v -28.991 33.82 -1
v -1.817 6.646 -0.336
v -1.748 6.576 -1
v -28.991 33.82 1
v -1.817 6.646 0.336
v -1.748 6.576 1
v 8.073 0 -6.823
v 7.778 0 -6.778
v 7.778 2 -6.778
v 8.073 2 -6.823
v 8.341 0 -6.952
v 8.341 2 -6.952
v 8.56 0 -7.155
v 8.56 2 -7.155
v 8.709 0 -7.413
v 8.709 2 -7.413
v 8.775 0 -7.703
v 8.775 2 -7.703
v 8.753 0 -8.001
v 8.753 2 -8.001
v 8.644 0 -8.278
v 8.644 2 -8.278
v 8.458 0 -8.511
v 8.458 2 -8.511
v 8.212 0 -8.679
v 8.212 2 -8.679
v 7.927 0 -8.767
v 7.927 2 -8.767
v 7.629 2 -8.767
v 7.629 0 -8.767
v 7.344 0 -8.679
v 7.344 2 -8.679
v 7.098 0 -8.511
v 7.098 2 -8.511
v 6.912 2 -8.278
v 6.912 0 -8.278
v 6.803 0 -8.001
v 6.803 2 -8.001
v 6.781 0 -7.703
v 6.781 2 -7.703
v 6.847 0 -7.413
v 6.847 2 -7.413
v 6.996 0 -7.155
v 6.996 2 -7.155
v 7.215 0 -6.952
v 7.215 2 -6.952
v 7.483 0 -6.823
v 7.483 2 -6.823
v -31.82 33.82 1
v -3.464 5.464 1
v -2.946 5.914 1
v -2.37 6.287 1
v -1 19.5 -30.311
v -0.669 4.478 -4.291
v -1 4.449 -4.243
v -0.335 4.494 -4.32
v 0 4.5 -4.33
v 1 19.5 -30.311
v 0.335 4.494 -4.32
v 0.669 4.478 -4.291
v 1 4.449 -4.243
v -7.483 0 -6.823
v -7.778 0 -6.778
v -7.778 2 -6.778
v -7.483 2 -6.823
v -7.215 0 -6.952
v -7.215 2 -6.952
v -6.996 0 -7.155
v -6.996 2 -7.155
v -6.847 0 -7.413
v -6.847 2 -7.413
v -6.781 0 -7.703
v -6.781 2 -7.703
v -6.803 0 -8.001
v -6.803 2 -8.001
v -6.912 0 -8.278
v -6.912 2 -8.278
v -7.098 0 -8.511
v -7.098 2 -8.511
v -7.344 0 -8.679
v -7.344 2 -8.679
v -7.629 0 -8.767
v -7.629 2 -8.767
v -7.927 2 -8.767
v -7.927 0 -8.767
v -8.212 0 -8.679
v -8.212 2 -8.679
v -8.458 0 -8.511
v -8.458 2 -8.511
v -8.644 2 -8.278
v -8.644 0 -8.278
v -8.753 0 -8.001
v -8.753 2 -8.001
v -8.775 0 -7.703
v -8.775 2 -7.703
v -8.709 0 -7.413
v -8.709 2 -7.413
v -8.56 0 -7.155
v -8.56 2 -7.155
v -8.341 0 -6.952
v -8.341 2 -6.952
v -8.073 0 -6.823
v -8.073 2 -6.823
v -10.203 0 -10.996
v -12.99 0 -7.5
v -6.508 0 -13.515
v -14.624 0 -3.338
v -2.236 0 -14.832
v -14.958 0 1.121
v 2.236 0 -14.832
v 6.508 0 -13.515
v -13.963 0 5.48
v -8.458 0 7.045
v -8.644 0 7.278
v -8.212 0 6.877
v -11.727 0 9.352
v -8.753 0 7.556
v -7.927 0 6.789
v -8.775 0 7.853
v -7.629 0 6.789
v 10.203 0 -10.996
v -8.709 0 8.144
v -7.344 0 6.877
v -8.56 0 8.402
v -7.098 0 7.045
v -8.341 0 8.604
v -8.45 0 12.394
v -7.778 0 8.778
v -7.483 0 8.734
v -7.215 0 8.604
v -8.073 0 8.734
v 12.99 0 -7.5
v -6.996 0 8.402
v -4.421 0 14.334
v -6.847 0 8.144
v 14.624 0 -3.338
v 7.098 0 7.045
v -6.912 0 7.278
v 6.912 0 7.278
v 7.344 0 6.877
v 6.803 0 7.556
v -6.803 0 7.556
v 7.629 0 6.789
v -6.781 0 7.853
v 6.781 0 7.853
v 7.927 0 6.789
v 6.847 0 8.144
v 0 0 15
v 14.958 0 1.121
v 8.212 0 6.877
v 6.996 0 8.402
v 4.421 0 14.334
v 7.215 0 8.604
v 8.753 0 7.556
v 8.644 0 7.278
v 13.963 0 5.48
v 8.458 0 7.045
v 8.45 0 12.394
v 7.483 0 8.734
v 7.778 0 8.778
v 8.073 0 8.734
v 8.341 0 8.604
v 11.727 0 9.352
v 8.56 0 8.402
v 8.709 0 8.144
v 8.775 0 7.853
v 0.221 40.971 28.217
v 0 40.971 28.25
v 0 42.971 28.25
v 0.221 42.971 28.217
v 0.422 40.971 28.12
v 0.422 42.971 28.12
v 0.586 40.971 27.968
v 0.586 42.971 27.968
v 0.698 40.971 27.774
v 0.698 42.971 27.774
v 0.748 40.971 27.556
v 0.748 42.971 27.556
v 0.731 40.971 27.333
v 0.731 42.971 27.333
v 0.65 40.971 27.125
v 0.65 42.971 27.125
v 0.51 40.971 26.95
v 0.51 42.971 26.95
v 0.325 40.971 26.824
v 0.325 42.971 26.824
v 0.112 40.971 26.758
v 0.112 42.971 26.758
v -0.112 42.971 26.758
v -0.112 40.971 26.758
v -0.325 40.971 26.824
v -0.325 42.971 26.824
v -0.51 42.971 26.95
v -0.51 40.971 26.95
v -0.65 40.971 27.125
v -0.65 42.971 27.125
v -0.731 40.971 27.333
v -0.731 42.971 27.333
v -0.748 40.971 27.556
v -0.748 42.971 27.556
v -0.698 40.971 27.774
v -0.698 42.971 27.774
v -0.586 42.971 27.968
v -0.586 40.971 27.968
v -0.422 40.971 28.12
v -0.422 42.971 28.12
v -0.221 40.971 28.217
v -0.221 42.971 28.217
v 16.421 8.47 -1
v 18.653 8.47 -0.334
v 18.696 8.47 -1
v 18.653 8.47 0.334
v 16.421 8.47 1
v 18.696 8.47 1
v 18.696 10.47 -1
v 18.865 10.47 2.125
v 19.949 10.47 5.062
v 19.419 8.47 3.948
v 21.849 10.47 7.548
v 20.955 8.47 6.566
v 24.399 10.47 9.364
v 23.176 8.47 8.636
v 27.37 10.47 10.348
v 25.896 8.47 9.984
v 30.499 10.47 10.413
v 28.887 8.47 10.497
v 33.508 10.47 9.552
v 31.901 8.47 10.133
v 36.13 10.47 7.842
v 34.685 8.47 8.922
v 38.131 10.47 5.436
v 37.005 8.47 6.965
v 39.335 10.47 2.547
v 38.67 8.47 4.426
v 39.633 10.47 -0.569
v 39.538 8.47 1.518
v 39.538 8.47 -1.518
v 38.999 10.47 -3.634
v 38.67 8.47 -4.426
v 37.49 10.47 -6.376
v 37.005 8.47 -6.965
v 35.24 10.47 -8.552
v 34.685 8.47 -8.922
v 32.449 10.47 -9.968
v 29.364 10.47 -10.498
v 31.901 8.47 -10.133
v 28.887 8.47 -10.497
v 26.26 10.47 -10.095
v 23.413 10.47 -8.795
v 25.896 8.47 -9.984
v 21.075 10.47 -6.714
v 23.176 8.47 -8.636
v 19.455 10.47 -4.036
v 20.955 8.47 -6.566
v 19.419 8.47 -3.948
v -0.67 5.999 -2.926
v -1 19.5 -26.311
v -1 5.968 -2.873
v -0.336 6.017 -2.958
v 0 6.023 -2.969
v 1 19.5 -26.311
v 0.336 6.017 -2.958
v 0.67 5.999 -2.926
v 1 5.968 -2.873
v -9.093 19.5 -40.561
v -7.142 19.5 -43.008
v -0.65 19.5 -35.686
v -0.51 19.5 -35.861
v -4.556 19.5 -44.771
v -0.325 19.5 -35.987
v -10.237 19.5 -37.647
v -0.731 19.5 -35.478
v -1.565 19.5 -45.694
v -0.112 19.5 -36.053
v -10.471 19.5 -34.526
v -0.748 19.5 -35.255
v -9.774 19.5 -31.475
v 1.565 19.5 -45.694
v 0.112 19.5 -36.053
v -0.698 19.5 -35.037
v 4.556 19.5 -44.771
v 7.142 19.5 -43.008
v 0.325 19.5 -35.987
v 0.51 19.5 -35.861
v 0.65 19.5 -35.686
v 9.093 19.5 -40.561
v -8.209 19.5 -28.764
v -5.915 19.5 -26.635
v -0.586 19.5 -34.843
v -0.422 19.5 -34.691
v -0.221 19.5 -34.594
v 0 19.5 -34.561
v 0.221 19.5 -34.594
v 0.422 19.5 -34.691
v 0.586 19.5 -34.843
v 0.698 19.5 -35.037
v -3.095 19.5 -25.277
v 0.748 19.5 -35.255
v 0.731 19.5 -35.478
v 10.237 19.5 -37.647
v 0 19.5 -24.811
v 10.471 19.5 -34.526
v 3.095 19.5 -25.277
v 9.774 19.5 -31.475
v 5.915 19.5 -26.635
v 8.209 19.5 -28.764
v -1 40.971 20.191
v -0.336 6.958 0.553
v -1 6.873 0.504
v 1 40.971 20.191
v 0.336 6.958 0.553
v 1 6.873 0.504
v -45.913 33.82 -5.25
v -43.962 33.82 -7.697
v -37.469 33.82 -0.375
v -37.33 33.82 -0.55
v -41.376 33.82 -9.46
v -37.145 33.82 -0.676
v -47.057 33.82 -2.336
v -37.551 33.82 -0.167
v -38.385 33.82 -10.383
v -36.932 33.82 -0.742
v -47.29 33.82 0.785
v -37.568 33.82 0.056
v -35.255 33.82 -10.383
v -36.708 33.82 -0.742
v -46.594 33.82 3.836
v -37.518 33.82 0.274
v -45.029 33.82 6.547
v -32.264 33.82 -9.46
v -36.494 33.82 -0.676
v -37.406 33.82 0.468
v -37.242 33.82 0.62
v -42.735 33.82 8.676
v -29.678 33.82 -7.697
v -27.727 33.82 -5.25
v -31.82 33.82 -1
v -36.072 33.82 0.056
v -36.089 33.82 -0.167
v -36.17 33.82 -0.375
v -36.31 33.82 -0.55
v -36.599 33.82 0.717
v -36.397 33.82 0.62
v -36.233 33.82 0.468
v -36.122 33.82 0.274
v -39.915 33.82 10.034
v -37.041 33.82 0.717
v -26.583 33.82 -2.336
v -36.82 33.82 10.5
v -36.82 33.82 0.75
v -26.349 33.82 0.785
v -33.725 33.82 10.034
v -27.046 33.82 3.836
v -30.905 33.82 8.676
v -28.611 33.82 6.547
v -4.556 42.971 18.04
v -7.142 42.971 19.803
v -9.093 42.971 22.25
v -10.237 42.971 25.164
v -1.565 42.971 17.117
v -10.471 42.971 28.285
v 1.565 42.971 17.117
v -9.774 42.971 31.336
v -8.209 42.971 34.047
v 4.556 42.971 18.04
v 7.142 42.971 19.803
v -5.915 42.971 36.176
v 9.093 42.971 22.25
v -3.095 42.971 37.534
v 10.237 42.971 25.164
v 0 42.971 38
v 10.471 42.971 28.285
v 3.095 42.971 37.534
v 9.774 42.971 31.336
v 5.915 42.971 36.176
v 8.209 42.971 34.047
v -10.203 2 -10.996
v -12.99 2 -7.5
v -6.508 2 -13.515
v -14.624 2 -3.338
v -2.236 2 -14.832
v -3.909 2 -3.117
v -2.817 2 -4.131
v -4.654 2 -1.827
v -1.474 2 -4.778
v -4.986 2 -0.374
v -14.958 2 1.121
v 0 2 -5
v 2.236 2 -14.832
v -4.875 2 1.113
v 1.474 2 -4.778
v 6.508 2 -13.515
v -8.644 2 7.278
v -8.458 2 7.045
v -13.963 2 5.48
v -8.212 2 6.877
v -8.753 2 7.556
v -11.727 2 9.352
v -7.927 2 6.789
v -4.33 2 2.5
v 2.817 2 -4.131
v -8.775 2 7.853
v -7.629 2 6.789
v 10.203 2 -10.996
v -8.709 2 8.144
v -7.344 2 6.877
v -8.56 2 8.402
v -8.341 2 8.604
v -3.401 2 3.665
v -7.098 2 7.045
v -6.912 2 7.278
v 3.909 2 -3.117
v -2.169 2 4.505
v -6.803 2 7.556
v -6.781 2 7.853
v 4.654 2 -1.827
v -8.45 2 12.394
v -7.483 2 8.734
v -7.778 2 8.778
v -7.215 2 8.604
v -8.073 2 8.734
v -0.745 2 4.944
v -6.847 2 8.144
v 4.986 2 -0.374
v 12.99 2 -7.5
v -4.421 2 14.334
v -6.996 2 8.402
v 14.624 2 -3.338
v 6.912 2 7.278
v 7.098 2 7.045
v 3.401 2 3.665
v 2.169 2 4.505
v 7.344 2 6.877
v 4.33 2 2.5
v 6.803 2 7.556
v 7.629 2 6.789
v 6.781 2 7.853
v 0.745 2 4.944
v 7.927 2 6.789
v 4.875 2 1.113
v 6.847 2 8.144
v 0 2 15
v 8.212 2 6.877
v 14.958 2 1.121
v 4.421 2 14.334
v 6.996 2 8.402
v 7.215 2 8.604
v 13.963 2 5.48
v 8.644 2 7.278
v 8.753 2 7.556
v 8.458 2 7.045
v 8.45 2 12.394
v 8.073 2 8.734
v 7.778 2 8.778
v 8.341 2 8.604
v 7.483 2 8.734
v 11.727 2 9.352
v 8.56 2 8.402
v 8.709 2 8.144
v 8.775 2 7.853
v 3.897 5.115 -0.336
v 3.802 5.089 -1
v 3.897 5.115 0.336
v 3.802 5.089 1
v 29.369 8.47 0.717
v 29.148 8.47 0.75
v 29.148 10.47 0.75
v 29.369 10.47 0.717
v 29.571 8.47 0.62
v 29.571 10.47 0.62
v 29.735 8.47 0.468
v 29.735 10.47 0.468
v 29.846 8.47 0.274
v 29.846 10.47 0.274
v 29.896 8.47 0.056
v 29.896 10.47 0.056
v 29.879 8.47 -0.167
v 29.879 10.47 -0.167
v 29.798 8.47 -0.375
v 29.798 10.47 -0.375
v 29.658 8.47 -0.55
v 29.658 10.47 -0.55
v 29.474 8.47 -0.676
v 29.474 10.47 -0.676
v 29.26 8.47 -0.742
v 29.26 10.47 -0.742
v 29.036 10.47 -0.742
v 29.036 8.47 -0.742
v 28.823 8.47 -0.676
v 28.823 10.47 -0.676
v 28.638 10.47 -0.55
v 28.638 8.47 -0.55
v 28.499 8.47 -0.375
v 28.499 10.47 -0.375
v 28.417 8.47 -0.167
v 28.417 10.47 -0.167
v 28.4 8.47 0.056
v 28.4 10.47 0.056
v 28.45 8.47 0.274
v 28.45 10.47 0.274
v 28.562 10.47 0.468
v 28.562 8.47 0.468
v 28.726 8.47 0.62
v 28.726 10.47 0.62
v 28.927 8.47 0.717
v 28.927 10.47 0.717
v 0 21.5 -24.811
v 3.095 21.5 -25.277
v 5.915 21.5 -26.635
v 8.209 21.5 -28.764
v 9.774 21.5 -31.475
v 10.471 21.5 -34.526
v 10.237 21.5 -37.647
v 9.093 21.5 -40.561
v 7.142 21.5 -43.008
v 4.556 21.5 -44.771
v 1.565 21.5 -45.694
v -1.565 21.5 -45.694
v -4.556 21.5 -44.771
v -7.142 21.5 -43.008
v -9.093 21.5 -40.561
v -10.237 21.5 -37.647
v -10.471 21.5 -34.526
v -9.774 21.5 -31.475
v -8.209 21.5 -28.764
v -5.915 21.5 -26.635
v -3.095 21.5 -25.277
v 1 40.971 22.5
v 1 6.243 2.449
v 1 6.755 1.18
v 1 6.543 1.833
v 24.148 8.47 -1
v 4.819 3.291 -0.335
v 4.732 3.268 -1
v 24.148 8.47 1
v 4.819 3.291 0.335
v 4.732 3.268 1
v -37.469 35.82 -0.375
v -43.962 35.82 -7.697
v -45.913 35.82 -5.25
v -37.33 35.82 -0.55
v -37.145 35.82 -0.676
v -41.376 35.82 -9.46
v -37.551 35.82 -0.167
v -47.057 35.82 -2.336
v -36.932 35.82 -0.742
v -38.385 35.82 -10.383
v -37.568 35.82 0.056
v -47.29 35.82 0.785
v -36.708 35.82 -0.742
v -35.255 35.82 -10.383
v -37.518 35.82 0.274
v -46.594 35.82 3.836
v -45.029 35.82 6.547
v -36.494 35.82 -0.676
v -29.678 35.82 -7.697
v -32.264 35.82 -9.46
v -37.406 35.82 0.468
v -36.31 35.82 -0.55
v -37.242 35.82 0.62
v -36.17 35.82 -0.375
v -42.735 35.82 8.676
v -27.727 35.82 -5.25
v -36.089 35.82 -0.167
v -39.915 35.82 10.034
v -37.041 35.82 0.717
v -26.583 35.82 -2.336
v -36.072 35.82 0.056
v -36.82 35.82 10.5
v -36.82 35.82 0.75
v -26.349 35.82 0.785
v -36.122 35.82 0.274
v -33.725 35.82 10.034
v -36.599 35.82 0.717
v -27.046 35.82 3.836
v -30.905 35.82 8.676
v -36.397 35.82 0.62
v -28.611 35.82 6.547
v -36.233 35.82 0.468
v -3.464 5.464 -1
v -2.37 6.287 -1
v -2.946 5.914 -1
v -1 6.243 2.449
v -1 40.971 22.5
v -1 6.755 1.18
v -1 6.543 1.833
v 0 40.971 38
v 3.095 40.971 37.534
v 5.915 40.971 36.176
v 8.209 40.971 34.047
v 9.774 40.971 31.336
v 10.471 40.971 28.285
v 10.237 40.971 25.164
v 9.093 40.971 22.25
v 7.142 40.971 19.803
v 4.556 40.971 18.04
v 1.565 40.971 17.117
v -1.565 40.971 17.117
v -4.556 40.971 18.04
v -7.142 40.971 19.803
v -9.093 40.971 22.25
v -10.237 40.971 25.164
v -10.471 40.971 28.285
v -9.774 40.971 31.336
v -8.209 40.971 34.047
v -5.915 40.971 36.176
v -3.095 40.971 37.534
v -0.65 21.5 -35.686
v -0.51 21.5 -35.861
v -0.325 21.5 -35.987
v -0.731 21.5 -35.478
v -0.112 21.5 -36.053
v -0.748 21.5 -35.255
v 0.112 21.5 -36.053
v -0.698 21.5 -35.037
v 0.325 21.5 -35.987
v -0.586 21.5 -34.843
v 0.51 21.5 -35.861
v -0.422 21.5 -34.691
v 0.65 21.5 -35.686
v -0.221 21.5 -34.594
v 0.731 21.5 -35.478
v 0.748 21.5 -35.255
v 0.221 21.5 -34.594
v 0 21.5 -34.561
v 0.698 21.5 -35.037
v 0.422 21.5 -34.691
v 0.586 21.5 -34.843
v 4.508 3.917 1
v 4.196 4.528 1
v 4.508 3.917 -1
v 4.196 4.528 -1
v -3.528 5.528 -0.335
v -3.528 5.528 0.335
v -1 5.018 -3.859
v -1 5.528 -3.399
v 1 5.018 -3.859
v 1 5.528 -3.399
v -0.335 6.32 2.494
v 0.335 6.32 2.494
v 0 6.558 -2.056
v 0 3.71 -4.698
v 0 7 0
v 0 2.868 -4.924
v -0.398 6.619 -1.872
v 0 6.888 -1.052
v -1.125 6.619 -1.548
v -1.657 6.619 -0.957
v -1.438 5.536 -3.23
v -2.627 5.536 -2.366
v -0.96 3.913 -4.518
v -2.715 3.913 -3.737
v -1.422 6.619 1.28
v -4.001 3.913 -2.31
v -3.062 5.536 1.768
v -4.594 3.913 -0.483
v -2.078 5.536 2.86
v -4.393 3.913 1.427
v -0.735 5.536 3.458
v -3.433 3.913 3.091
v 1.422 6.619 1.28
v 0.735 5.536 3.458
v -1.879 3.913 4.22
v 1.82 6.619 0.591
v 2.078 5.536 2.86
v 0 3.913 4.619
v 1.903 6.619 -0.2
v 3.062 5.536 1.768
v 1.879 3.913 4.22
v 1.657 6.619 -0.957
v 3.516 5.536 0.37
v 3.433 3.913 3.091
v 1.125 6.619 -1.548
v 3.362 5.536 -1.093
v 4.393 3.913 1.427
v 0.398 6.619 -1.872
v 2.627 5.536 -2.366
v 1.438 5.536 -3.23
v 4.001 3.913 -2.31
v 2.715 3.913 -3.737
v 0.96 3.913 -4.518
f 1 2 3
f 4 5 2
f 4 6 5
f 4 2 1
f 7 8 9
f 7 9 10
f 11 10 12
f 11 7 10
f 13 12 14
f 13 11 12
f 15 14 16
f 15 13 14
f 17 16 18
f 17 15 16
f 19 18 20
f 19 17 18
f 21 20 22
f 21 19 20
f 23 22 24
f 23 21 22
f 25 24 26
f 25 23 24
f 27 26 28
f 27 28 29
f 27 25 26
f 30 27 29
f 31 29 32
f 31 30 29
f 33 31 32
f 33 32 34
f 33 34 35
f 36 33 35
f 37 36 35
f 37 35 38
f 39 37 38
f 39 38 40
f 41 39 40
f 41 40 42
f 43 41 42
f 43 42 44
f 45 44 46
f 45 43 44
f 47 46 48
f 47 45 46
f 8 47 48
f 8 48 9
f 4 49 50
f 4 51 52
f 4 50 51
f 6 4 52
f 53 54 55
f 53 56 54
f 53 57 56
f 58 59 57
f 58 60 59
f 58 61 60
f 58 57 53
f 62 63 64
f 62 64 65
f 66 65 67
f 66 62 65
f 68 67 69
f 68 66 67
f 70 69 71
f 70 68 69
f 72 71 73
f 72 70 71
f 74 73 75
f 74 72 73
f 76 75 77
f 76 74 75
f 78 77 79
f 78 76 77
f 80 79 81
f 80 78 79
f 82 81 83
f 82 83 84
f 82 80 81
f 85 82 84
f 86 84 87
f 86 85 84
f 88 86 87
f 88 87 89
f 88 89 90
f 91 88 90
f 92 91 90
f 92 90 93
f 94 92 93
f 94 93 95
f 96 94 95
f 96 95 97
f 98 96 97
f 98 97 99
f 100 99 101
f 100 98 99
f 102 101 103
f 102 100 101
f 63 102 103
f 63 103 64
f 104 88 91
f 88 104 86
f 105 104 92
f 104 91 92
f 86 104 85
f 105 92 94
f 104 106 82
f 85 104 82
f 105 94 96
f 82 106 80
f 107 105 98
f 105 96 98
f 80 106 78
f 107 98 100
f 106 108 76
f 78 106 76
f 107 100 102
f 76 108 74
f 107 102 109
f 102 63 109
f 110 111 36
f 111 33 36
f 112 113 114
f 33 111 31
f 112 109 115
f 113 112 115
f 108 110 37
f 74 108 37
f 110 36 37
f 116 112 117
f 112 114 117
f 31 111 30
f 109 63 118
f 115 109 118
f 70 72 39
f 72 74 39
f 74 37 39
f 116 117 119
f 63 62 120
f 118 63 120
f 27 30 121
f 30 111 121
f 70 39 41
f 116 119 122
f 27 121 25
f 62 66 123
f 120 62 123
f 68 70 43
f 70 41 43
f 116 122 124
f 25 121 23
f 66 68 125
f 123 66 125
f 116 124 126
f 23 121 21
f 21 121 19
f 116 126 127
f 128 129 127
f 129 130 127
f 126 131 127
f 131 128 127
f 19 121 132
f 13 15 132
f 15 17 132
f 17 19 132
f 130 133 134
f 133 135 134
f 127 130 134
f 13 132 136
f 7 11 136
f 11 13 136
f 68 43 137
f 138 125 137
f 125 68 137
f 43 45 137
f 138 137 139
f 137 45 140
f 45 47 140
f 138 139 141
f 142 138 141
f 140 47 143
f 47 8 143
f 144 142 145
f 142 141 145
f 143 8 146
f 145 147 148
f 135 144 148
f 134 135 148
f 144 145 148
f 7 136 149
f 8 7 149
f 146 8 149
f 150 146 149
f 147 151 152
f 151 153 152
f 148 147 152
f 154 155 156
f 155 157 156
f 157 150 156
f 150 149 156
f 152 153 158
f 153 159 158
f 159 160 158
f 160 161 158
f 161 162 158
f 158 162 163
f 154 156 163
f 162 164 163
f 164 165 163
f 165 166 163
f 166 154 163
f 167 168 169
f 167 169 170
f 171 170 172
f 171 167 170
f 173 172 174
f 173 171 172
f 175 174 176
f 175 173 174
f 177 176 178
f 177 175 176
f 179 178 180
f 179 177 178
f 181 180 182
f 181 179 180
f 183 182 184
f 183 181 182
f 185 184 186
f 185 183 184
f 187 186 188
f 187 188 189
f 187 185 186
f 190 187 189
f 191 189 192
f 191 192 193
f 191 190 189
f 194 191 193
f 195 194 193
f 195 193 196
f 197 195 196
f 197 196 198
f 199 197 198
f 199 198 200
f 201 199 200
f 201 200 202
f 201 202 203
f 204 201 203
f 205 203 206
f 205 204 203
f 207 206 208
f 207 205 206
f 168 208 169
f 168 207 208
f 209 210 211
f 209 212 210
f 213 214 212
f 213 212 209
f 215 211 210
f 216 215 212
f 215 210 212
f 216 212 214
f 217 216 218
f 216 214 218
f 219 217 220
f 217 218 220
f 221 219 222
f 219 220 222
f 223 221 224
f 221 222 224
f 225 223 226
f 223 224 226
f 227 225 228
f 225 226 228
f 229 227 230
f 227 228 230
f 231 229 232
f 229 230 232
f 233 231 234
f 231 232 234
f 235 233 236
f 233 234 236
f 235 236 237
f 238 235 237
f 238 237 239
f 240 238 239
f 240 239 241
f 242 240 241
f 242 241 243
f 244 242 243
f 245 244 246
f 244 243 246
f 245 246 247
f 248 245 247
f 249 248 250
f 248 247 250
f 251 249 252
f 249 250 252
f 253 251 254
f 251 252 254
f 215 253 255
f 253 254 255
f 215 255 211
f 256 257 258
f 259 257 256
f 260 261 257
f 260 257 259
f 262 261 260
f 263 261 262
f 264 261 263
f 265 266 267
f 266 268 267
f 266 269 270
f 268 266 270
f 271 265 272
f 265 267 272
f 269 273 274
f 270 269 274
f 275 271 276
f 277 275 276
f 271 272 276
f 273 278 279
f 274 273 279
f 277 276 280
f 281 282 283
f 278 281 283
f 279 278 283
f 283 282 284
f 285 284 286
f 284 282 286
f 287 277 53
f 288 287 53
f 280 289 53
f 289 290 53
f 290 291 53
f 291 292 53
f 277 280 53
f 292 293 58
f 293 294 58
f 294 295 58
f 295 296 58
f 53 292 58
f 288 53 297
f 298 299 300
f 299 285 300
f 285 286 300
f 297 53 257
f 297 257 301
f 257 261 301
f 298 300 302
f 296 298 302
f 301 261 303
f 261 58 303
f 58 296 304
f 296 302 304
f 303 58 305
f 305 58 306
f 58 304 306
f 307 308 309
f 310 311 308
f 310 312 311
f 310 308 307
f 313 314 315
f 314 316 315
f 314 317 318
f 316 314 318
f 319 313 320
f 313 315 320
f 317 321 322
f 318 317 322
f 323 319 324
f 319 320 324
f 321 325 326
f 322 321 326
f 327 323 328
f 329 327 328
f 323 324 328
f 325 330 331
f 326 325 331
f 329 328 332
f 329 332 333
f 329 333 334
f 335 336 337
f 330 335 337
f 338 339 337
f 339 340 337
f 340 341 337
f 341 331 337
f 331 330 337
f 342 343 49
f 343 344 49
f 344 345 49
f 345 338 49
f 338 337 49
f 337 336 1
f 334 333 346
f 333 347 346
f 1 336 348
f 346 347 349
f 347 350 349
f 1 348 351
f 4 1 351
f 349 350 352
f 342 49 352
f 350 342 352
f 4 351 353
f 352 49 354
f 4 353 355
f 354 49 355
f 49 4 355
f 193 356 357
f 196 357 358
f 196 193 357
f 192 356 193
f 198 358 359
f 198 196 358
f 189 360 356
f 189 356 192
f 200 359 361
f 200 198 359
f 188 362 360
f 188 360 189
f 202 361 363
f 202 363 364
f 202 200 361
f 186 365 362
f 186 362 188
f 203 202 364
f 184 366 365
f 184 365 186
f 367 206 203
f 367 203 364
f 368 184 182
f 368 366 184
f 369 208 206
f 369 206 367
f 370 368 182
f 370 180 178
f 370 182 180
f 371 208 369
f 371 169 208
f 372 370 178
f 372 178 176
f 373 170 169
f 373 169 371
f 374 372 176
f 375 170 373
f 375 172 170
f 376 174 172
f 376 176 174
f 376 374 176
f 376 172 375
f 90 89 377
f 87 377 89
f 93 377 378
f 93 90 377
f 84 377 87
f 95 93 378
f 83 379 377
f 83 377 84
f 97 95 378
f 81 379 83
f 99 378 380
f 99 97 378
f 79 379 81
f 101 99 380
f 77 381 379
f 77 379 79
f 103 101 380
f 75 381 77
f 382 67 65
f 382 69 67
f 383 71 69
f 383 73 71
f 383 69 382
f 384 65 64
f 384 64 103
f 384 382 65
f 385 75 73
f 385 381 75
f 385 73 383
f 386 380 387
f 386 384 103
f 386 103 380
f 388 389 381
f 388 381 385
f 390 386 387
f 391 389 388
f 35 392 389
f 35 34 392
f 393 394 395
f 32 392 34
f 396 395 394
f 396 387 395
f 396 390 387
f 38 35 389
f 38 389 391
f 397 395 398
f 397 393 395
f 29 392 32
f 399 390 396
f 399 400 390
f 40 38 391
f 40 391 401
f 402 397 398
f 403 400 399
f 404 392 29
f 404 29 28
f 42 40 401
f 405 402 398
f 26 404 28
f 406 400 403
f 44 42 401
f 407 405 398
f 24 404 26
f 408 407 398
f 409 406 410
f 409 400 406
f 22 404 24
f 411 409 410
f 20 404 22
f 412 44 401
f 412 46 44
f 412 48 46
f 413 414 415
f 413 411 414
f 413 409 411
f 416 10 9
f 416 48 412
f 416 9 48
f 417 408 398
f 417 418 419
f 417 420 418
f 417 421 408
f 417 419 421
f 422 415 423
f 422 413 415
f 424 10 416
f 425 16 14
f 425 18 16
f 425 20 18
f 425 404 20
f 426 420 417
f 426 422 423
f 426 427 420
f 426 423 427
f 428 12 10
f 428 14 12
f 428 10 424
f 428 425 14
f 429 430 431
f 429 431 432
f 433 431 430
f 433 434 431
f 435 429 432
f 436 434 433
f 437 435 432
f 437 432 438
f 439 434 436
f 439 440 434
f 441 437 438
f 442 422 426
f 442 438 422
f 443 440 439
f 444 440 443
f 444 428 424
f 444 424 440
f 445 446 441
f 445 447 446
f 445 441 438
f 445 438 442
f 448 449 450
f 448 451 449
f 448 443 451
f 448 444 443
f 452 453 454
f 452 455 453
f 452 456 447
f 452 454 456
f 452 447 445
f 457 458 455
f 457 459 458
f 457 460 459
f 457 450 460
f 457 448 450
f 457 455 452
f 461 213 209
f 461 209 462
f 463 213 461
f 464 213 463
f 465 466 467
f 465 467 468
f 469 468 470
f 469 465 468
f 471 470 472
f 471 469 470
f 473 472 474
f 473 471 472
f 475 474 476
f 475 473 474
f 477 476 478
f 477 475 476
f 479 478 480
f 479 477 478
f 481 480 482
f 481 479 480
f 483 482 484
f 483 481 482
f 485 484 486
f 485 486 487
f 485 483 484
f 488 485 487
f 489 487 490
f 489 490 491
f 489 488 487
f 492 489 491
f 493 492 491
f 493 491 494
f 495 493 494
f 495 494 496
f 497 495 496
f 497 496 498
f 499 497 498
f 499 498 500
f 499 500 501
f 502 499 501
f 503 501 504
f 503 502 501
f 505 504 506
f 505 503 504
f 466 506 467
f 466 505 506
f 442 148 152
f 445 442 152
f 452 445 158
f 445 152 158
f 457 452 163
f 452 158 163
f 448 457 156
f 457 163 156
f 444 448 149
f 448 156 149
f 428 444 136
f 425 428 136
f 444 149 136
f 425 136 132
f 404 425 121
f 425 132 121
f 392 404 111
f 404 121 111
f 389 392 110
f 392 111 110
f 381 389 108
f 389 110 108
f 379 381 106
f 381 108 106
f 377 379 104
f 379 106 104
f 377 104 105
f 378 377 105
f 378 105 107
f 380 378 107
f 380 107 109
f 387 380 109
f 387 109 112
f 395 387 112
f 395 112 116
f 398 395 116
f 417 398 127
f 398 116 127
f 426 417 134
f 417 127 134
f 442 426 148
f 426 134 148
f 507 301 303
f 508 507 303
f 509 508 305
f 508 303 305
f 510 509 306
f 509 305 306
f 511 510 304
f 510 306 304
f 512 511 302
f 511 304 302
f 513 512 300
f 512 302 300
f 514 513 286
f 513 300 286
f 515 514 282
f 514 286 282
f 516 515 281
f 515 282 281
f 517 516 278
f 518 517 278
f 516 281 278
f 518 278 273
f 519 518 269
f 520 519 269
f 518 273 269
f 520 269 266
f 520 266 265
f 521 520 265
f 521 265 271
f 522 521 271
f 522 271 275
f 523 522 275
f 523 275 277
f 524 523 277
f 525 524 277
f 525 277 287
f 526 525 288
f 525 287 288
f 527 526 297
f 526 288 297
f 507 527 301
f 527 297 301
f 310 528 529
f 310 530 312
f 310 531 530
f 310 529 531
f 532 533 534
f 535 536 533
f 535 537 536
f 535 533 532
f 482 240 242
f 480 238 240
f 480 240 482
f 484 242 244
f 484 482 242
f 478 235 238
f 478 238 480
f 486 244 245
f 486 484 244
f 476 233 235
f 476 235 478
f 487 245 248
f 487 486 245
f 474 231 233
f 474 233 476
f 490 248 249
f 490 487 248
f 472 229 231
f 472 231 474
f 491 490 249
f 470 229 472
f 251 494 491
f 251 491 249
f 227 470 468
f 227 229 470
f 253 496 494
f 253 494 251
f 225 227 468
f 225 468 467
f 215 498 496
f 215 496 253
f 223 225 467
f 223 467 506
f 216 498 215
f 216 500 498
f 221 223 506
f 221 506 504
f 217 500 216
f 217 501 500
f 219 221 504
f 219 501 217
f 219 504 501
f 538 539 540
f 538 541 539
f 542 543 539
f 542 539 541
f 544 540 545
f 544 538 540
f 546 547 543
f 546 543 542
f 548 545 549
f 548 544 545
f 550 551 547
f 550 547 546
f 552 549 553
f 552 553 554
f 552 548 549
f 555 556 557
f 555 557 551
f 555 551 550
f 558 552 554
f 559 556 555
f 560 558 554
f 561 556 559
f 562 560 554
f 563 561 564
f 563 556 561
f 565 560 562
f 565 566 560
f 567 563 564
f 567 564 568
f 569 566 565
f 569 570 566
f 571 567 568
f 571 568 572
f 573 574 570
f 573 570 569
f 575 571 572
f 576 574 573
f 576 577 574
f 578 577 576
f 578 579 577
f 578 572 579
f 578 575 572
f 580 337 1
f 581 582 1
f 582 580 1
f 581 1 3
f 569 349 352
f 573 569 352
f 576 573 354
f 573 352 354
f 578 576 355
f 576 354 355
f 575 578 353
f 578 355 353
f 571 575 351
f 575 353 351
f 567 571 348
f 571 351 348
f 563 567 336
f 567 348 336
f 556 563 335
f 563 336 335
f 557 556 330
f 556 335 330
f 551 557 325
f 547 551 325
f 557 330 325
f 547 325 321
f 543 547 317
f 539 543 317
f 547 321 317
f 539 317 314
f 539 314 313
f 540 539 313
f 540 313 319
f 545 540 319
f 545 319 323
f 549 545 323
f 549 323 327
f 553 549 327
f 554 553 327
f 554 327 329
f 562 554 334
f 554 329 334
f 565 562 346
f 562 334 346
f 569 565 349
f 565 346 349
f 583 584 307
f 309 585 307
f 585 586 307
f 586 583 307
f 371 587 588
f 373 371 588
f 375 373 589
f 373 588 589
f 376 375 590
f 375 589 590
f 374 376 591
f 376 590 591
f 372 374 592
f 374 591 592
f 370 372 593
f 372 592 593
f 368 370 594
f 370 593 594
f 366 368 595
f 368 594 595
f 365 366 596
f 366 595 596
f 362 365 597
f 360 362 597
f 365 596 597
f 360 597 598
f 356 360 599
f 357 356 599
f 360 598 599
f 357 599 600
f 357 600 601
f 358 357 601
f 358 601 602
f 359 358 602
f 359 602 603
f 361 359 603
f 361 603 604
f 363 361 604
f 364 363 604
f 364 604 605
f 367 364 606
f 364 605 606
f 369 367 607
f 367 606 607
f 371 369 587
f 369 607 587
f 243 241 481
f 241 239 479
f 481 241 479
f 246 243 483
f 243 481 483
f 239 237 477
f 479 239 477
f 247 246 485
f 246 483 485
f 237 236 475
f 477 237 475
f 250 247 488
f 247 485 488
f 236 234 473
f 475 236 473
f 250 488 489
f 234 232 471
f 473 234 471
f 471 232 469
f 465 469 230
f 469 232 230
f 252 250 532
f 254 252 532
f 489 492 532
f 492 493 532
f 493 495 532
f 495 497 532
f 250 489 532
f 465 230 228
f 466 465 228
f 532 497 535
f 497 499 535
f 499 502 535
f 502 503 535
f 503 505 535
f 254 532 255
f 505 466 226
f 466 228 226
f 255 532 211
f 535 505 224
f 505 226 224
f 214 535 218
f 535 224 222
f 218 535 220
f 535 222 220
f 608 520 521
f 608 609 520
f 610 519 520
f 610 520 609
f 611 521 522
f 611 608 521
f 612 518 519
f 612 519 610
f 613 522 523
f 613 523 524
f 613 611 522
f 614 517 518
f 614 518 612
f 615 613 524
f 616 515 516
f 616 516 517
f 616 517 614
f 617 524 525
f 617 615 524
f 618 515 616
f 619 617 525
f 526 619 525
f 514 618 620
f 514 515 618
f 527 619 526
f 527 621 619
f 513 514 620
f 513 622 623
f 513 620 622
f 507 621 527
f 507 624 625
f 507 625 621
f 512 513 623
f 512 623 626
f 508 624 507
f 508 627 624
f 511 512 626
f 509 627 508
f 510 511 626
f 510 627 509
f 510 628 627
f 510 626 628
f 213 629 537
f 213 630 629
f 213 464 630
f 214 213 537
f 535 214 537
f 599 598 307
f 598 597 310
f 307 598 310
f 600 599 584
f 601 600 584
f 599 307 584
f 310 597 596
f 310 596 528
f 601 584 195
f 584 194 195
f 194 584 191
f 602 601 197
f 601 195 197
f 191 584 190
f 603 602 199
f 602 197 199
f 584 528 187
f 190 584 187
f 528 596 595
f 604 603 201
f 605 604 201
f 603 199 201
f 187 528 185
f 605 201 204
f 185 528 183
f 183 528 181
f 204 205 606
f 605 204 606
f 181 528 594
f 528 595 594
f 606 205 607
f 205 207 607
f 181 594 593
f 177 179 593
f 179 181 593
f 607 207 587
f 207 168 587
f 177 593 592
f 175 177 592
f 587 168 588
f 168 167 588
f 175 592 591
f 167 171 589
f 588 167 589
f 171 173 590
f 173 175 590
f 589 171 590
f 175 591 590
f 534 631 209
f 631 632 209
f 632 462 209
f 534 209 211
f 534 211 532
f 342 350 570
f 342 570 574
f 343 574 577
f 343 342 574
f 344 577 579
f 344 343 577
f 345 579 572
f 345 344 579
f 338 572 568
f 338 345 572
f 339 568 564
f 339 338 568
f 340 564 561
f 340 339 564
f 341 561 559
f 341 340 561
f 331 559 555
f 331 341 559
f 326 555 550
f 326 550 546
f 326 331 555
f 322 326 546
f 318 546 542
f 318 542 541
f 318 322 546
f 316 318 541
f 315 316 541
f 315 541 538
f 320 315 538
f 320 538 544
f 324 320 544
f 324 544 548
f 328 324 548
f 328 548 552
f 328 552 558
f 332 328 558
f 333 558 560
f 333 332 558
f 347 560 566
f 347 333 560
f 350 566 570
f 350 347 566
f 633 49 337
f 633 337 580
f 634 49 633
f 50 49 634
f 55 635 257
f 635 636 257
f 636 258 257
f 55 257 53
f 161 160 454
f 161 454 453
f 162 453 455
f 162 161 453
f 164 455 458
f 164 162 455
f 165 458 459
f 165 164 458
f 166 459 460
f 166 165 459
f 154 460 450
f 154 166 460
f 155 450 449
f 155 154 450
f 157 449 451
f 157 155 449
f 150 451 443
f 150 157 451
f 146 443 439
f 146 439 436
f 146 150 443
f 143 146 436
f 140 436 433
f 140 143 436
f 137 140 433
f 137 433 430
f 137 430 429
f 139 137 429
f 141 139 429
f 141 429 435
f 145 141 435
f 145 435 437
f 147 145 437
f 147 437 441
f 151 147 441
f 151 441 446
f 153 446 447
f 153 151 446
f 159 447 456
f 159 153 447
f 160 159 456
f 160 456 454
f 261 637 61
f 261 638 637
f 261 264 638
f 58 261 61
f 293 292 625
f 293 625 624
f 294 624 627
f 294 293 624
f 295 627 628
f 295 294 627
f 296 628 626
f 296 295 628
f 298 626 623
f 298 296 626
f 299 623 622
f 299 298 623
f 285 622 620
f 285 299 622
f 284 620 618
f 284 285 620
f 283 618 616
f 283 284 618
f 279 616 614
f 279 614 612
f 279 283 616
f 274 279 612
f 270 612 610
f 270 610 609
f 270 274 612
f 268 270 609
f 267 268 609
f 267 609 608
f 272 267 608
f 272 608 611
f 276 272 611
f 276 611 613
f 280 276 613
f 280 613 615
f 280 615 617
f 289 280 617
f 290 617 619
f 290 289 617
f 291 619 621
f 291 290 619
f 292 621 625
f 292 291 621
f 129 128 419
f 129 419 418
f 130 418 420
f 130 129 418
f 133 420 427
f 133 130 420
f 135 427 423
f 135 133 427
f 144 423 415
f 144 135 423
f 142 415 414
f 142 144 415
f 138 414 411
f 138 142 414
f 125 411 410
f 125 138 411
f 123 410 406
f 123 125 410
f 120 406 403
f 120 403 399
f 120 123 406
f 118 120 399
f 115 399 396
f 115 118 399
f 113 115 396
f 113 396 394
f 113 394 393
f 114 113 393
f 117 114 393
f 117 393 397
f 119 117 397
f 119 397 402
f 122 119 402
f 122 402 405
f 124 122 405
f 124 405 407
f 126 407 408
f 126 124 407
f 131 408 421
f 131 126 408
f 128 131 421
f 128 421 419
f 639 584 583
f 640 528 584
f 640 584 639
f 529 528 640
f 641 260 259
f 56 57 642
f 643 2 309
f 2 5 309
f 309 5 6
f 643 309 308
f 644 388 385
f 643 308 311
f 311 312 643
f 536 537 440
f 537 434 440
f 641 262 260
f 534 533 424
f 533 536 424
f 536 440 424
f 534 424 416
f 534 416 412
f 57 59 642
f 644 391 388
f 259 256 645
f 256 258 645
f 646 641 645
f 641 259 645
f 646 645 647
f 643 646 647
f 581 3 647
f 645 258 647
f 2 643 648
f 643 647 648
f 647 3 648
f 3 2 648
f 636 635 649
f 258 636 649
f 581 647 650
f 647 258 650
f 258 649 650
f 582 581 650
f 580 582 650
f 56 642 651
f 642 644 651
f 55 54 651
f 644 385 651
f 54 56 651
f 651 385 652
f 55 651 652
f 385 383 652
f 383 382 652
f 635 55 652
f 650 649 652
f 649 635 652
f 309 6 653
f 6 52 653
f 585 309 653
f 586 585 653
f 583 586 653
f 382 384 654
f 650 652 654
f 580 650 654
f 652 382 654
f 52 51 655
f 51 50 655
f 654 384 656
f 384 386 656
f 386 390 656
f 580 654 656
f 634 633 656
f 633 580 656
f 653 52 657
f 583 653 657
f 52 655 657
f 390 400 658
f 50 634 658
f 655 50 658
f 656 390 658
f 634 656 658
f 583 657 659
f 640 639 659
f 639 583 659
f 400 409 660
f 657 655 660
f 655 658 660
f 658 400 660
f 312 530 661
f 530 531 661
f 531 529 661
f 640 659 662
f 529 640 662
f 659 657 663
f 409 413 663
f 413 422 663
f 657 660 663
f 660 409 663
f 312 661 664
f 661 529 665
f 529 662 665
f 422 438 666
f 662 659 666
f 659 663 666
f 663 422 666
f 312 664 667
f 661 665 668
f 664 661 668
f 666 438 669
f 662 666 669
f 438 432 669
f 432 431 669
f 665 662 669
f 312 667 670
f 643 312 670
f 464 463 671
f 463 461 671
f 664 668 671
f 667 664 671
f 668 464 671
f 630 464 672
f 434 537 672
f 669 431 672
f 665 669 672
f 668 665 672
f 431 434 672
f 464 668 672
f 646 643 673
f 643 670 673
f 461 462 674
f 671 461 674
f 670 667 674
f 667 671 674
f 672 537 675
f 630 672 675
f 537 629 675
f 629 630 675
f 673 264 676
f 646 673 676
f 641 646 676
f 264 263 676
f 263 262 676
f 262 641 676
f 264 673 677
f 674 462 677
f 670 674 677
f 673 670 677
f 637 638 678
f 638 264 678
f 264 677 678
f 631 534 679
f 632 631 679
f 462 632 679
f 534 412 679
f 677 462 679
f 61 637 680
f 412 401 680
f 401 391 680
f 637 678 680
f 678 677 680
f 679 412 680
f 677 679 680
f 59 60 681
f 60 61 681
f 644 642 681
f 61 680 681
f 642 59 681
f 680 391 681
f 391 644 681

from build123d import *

# Parameters (mm, degrees)
SKETCH_1_R      = 15
SKETCH_1_R_2    = 1
EXTRUDE_1_DEPTH = 2
EXTRUDE_2_DEPTH = 1
SKETCH_4_R      = 10.5
SKETCH_4_R_2    = 0.75
EXTRUDE_3_DEPTH = 2
SKETCH_5_R      = 10.5
SKETCH_5_R_2    = 0.75
EXTRUDE_4_DEPTH = 2
EXTRUDE_5_DEPTH = 1
SKETCH_7_R      = 10.5
SKETCH_7_R_2    = 0.75
EXTRUDE_6_DEPTH = 2
SKETCH_8_R      = 10.5
SKETCH_8_R_2    = 0.75
EXTRUDE_7_DEPTH = 2


with BuildPart() as part:
    # 草图1 → 凸台-拉伸1 (new body)
    with BuildSketch(Plane(origin=(0, 0, 0), x_dir=(1, 0, 0), z_dir=(0, 1, 0))):
        with Locations(Location((0, 0, 0), (0, 0, 270))):
            Circle(SKETCH_1_R)
        with Locations(Location((7.778174593, 7.778174593, 0), (0, 0, 270))):
            Circle(SKETCH_1_R_2, mode=Mode.SUBTRACT)
        with Locations(Location((-7.778174593, 7.778174593, 0), (0, 0, 270))):
            Circle(SKETCH_1_R_2, mode=Mode.SUBTRACT)
        with Locations(Location((-7.778174593, -7.778174593, 0), (0, 0, 270))):
            Circle(SKETCH_1_R_2, mode=Mode.SUBTRACT)
        with Locations(Location((7.778174593, -7.778174593, 0), (0, 0, 270))):
            Circle(SKETCH_1_R_2, mode=Mode.SUBTRACT)
    extrude(amount=EXTRUDE_1_DEPTH)

    # 草图2 → 旋转1 (revolve)
    with BuildSketch(Plane(origin=(0, 0, 0), x_dir=(0, 0, -1), z_dir=(1, 0, 0))):
        with BuildLine():
            Line((0, 2), (0, 7))
            ThreePointArc((0, 7), (3.535533906, 5.535533906), (5, 2))
            Line((5, 2), (0, 2))
        make_face()
    revolve(axis=Axis((0, 2, 0), (0, 1, 0)))

    # 草图3 → 凸台-拉伸2 (add, symmetric)
    with BuildSketch(Plane.XY):
        Polygon((0, 2), (24.148145657, 8.470476128), (16.420739047, 8.470476128), (0, 4.070552361), (0, 4.828427125), (-28.991378029, 33.819805153), (-31.819805153, 33.819805153), align=None)
    extrude(amount=EXTRUDE_2_DEPTH, both=True)

    # 草图4 → 凸台-拉伸3 (add)
    with BuildSketch(Plane(origin=(0, 8.470476128, 0), x_dir=(1, 0, 0), z_dir=(0, 1, 0))):
        with Locations(Location((29.148145657, 0, 0), (0, 0, 174.5349762))):
            Circle(SKETCH_4_R)
        with Locations(Location((29.148145657, 0, 0), (0, 0, 270))):
            Circle(SKETCH_4_R_2, mode=Mode.SUBTRACT)
    extrude(amount=EXTRUDE_3_DEPTH)

    # 草图5 → 凸台-拉伸4 (add)
    with BuildSketch(Plane(origin=(0, 33.819805153, 0), x_dir=(1, 0, 0), z_dir=(0, 1, 0))):
        with Locations(Location((-36.819805153, 0, 0), (0, 0, 270))):
            Circle(SKETCH_5_R)
        with Locations(Location((-36.819805153, 0, 0), (0, 0, 270))):
            Circle(SKETCH_5_R_2, mode=Mode.SUBTRACT)
    extrude(amount=EXTRUDE_4_DEPTH)

    # 草图6 → 凸台-拉伸5 (add, symmetric)
    with BuildSketch(Plane(origin=(0, 0, 0), x_dir=(0, 0, -1), z_dir=(1, 0, 0))):
        Polygon((0, 2), (30.310889132, 19.5), (26.310889132, 19.5), (0, 4.309401077), (0, 6), (-20.190598923, 40.97114317), (-22.5, 40.97114317), align=None)
    extrude(amount=EXTRUDE_5_DEPTH, both=True)

    # 草图7 → 凸台-拉伸6 (add)
    with BuildSketch(Plane(origin=(0, 19.5, 0), x_dir=(1, 0, 0), z_dir=(0, 1, 0))):
        with Locations(Location((0, 35.310889132, 0), (0, 0, 270))):
            Circle(SKETCH_7_R)
        with Locations(Location((0, 35.310889132, 0), (0, 0, 270))):
            Circle(SKETCH_7_R_2, mode=Mode.SUBTRACT)
    extrude(amount=EXTRUDE_6_DEPTH)

    # 草图8 → 凸台-拉伸7 (add)
    with BuildSketch(Plane(origin=(0, 40.97114317, 0), x_dir=(1, 0, 0), z_dir=(0, 1, 0))):
        with Locations(Location((0, -27.5, 0), (0, 0, 270))):
            Circle(SKETCH_8_R)
        with Locations(Location((0, -27.5, 0), (0, 0, 270))):
            Circle(SKETCH_8_R_2, mode=Mode.SUBTRACT)
    extrude(amount=EXTRUDE_7_DEPTH)


solid = part.part
